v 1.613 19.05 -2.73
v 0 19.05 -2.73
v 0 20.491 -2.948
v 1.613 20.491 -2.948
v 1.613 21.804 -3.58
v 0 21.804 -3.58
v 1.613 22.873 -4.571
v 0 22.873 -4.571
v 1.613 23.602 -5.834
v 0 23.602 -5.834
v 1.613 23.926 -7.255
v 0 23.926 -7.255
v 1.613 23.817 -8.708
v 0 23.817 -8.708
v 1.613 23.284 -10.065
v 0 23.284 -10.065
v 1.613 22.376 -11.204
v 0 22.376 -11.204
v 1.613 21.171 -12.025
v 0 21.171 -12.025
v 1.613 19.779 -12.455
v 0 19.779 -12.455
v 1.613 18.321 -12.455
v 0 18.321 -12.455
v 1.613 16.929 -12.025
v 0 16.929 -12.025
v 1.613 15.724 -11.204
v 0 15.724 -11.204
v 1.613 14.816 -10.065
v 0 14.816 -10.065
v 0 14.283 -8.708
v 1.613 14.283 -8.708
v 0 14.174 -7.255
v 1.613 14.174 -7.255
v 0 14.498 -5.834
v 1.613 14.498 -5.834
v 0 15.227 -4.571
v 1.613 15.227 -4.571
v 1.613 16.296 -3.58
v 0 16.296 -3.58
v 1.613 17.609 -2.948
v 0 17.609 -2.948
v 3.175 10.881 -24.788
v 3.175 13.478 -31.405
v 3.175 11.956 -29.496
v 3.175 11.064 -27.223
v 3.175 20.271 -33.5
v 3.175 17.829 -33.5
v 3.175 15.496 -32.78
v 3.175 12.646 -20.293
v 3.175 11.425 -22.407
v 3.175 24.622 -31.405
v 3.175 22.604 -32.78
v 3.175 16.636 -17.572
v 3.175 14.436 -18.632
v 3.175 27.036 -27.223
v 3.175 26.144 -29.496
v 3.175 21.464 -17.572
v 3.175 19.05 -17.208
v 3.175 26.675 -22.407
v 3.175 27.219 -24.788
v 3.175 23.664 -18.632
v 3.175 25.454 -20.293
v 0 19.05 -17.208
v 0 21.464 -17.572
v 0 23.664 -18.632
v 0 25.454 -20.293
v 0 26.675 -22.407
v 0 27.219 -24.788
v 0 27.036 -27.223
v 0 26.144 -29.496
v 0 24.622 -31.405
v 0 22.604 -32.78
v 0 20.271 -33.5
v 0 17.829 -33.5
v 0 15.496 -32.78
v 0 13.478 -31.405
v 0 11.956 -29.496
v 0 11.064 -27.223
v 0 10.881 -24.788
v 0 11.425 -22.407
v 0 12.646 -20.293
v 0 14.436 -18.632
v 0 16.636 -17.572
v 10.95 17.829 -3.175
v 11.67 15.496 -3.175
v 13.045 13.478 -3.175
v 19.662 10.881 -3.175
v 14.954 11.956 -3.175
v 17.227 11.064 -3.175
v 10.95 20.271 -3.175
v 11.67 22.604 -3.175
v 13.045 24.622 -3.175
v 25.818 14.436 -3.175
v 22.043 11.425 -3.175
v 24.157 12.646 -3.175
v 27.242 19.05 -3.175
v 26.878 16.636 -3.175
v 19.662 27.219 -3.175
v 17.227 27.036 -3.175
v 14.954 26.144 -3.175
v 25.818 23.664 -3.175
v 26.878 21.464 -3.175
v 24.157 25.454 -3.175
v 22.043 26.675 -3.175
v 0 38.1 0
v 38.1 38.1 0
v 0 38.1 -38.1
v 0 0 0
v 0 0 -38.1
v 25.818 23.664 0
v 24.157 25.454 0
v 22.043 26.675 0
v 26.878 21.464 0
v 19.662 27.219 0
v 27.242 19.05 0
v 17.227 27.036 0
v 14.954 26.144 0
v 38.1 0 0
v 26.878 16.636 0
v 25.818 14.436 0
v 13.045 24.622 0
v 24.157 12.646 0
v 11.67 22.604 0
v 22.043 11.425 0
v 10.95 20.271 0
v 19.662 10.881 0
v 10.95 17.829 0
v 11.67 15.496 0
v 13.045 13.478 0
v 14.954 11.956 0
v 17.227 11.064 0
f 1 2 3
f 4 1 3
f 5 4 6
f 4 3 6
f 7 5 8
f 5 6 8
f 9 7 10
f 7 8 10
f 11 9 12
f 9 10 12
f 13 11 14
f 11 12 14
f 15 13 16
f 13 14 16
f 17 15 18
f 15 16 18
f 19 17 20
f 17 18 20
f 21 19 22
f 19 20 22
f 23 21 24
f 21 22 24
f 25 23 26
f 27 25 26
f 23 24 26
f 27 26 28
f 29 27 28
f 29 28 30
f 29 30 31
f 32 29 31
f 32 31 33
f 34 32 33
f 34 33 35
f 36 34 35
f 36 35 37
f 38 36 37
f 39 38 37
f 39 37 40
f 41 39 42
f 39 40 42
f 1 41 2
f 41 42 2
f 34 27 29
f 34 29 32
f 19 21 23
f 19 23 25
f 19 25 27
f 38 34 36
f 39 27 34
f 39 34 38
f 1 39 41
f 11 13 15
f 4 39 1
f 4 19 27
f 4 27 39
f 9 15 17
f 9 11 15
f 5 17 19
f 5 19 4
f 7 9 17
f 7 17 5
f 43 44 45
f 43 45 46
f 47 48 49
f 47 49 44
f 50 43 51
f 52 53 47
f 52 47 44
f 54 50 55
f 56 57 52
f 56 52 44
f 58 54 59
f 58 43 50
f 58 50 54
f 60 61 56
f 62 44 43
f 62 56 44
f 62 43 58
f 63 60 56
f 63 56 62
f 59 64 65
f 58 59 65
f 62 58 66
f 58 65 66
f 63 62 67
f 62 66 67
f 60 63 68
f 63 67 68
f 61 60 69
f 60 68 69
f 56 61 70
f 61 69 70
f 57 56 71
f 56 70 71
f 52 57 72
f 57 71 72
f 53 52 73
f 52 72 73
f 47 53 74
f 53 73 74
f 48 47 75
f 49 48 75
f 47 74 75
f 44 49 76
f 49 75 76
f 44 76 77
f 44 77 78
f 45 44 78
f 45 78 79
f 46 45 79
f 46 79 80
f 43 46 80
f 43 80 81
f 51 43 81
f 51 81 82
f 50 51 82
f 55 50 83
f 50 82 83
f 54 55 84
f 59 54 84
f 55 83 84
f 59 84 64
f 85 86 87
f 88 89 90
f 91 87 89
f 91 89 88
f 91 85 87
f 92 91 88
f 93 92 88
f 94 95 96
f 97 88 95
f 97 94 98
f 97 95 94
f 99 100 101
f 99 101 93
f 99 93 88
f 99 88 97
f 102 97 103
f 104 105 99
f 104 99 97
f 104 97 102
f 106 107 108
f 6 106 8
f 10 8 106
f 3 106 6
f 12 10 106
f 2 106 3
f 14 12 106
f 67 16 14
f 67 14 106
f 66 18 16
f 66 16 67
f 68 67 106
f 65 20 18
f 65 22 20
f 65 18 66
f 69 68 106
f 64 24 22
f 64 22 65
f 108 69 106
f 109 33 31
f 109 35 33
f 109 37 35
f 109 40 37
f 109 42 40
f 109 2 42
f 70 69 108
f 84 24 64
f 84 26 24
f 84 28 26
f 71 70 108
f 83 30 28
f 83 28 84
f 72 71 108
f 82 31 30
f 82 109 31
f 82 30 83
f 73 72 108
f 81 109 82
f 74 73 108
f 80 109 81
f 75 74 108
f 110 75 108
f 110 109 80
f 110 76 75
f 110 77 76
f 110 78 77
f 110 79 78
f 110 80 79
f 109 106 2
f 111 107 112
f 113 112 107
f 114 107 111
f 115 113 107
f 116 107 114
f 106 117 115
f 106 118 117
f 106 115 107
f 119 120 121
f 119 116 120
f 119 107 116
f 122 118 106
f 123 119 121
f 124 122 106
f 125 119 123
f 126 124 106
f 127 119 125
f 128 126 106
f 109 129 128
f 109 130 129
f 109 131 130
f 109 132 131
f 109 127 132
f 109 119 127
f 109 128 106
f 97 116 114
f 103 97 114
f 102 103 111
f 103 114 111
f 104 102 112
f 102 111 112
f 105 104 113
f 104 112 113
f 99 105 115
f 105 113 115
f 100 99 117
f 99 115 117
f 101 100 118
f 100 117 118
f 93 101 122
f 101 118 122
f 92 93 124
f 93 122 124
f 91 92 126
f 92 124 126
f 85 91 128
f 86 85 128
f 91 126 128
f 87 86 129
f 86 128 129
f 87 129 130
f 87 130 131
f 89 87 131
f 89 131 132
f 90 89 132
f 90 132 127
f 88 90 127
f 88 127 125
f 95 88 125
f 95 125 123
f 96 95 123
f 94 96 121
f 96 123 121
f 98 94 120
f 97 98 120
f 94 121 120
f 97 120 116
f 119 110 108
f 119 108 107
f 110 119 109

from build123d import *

# Parameters (mm, degrees)
BOSS_EXTRUDE1_DEPTH = 38.1
SKETCH2_R           = 8.1915
CUT_EXTRUDE1_DEPTH  = 3.175
SKETCH3_R           = 8.1915
CUT_EXTRUDE2_DEPTH  = 3.175
SKETCH4_R           = 4.8895
CUT_EXTRUDE3_DEPTH  = 1.6129


with BuildPart() as part:
    # Sketch1 → Boss-Extrude1 (new body)
    with BuildSketch(Plane(origin=(0, 0, 0), x_dir=(1, 0, 0), z_dir=(0, 1, 0))):
        Polygon((0, 0), (0, 38.1), (38.1, 0), align=None)
    extrude(amount=BOSS_EXTRUDE1_DEPTH)

    # Sketch2 → Cut-Extrude1 (cut)
    with BuildSketch(Plane.XY):
        with Locations((19.05, 19.05)):
            Circle(SKETCH2_R)
    extrude(amount=-CUT_EXTRUDE1_DEPTH, mode=Mode.SUBTRACT)

    # Sketch3 → Cut-Extrude2 (cut)
    with BuildSketch(Plane.ZY):
        with Locations((-25.4, 19.05)):
            Circle(SKETCH3_R)
    extrude(amount=-CUT_EXTRUDE2_DEPTH, mode=Mode.SUBTRACT)

    # Sketch4 → Cut-Extrude3 (cut)
    with BuildSketch(Plane.ZY):
        with Locations((-7.62, 19.05)):
            Circle(SKETCH4_R)
    extrude(amount=-CUT_EXTRUDE3_DEPTH, mode=Mode.SUBTRACT)


solid = part.part
